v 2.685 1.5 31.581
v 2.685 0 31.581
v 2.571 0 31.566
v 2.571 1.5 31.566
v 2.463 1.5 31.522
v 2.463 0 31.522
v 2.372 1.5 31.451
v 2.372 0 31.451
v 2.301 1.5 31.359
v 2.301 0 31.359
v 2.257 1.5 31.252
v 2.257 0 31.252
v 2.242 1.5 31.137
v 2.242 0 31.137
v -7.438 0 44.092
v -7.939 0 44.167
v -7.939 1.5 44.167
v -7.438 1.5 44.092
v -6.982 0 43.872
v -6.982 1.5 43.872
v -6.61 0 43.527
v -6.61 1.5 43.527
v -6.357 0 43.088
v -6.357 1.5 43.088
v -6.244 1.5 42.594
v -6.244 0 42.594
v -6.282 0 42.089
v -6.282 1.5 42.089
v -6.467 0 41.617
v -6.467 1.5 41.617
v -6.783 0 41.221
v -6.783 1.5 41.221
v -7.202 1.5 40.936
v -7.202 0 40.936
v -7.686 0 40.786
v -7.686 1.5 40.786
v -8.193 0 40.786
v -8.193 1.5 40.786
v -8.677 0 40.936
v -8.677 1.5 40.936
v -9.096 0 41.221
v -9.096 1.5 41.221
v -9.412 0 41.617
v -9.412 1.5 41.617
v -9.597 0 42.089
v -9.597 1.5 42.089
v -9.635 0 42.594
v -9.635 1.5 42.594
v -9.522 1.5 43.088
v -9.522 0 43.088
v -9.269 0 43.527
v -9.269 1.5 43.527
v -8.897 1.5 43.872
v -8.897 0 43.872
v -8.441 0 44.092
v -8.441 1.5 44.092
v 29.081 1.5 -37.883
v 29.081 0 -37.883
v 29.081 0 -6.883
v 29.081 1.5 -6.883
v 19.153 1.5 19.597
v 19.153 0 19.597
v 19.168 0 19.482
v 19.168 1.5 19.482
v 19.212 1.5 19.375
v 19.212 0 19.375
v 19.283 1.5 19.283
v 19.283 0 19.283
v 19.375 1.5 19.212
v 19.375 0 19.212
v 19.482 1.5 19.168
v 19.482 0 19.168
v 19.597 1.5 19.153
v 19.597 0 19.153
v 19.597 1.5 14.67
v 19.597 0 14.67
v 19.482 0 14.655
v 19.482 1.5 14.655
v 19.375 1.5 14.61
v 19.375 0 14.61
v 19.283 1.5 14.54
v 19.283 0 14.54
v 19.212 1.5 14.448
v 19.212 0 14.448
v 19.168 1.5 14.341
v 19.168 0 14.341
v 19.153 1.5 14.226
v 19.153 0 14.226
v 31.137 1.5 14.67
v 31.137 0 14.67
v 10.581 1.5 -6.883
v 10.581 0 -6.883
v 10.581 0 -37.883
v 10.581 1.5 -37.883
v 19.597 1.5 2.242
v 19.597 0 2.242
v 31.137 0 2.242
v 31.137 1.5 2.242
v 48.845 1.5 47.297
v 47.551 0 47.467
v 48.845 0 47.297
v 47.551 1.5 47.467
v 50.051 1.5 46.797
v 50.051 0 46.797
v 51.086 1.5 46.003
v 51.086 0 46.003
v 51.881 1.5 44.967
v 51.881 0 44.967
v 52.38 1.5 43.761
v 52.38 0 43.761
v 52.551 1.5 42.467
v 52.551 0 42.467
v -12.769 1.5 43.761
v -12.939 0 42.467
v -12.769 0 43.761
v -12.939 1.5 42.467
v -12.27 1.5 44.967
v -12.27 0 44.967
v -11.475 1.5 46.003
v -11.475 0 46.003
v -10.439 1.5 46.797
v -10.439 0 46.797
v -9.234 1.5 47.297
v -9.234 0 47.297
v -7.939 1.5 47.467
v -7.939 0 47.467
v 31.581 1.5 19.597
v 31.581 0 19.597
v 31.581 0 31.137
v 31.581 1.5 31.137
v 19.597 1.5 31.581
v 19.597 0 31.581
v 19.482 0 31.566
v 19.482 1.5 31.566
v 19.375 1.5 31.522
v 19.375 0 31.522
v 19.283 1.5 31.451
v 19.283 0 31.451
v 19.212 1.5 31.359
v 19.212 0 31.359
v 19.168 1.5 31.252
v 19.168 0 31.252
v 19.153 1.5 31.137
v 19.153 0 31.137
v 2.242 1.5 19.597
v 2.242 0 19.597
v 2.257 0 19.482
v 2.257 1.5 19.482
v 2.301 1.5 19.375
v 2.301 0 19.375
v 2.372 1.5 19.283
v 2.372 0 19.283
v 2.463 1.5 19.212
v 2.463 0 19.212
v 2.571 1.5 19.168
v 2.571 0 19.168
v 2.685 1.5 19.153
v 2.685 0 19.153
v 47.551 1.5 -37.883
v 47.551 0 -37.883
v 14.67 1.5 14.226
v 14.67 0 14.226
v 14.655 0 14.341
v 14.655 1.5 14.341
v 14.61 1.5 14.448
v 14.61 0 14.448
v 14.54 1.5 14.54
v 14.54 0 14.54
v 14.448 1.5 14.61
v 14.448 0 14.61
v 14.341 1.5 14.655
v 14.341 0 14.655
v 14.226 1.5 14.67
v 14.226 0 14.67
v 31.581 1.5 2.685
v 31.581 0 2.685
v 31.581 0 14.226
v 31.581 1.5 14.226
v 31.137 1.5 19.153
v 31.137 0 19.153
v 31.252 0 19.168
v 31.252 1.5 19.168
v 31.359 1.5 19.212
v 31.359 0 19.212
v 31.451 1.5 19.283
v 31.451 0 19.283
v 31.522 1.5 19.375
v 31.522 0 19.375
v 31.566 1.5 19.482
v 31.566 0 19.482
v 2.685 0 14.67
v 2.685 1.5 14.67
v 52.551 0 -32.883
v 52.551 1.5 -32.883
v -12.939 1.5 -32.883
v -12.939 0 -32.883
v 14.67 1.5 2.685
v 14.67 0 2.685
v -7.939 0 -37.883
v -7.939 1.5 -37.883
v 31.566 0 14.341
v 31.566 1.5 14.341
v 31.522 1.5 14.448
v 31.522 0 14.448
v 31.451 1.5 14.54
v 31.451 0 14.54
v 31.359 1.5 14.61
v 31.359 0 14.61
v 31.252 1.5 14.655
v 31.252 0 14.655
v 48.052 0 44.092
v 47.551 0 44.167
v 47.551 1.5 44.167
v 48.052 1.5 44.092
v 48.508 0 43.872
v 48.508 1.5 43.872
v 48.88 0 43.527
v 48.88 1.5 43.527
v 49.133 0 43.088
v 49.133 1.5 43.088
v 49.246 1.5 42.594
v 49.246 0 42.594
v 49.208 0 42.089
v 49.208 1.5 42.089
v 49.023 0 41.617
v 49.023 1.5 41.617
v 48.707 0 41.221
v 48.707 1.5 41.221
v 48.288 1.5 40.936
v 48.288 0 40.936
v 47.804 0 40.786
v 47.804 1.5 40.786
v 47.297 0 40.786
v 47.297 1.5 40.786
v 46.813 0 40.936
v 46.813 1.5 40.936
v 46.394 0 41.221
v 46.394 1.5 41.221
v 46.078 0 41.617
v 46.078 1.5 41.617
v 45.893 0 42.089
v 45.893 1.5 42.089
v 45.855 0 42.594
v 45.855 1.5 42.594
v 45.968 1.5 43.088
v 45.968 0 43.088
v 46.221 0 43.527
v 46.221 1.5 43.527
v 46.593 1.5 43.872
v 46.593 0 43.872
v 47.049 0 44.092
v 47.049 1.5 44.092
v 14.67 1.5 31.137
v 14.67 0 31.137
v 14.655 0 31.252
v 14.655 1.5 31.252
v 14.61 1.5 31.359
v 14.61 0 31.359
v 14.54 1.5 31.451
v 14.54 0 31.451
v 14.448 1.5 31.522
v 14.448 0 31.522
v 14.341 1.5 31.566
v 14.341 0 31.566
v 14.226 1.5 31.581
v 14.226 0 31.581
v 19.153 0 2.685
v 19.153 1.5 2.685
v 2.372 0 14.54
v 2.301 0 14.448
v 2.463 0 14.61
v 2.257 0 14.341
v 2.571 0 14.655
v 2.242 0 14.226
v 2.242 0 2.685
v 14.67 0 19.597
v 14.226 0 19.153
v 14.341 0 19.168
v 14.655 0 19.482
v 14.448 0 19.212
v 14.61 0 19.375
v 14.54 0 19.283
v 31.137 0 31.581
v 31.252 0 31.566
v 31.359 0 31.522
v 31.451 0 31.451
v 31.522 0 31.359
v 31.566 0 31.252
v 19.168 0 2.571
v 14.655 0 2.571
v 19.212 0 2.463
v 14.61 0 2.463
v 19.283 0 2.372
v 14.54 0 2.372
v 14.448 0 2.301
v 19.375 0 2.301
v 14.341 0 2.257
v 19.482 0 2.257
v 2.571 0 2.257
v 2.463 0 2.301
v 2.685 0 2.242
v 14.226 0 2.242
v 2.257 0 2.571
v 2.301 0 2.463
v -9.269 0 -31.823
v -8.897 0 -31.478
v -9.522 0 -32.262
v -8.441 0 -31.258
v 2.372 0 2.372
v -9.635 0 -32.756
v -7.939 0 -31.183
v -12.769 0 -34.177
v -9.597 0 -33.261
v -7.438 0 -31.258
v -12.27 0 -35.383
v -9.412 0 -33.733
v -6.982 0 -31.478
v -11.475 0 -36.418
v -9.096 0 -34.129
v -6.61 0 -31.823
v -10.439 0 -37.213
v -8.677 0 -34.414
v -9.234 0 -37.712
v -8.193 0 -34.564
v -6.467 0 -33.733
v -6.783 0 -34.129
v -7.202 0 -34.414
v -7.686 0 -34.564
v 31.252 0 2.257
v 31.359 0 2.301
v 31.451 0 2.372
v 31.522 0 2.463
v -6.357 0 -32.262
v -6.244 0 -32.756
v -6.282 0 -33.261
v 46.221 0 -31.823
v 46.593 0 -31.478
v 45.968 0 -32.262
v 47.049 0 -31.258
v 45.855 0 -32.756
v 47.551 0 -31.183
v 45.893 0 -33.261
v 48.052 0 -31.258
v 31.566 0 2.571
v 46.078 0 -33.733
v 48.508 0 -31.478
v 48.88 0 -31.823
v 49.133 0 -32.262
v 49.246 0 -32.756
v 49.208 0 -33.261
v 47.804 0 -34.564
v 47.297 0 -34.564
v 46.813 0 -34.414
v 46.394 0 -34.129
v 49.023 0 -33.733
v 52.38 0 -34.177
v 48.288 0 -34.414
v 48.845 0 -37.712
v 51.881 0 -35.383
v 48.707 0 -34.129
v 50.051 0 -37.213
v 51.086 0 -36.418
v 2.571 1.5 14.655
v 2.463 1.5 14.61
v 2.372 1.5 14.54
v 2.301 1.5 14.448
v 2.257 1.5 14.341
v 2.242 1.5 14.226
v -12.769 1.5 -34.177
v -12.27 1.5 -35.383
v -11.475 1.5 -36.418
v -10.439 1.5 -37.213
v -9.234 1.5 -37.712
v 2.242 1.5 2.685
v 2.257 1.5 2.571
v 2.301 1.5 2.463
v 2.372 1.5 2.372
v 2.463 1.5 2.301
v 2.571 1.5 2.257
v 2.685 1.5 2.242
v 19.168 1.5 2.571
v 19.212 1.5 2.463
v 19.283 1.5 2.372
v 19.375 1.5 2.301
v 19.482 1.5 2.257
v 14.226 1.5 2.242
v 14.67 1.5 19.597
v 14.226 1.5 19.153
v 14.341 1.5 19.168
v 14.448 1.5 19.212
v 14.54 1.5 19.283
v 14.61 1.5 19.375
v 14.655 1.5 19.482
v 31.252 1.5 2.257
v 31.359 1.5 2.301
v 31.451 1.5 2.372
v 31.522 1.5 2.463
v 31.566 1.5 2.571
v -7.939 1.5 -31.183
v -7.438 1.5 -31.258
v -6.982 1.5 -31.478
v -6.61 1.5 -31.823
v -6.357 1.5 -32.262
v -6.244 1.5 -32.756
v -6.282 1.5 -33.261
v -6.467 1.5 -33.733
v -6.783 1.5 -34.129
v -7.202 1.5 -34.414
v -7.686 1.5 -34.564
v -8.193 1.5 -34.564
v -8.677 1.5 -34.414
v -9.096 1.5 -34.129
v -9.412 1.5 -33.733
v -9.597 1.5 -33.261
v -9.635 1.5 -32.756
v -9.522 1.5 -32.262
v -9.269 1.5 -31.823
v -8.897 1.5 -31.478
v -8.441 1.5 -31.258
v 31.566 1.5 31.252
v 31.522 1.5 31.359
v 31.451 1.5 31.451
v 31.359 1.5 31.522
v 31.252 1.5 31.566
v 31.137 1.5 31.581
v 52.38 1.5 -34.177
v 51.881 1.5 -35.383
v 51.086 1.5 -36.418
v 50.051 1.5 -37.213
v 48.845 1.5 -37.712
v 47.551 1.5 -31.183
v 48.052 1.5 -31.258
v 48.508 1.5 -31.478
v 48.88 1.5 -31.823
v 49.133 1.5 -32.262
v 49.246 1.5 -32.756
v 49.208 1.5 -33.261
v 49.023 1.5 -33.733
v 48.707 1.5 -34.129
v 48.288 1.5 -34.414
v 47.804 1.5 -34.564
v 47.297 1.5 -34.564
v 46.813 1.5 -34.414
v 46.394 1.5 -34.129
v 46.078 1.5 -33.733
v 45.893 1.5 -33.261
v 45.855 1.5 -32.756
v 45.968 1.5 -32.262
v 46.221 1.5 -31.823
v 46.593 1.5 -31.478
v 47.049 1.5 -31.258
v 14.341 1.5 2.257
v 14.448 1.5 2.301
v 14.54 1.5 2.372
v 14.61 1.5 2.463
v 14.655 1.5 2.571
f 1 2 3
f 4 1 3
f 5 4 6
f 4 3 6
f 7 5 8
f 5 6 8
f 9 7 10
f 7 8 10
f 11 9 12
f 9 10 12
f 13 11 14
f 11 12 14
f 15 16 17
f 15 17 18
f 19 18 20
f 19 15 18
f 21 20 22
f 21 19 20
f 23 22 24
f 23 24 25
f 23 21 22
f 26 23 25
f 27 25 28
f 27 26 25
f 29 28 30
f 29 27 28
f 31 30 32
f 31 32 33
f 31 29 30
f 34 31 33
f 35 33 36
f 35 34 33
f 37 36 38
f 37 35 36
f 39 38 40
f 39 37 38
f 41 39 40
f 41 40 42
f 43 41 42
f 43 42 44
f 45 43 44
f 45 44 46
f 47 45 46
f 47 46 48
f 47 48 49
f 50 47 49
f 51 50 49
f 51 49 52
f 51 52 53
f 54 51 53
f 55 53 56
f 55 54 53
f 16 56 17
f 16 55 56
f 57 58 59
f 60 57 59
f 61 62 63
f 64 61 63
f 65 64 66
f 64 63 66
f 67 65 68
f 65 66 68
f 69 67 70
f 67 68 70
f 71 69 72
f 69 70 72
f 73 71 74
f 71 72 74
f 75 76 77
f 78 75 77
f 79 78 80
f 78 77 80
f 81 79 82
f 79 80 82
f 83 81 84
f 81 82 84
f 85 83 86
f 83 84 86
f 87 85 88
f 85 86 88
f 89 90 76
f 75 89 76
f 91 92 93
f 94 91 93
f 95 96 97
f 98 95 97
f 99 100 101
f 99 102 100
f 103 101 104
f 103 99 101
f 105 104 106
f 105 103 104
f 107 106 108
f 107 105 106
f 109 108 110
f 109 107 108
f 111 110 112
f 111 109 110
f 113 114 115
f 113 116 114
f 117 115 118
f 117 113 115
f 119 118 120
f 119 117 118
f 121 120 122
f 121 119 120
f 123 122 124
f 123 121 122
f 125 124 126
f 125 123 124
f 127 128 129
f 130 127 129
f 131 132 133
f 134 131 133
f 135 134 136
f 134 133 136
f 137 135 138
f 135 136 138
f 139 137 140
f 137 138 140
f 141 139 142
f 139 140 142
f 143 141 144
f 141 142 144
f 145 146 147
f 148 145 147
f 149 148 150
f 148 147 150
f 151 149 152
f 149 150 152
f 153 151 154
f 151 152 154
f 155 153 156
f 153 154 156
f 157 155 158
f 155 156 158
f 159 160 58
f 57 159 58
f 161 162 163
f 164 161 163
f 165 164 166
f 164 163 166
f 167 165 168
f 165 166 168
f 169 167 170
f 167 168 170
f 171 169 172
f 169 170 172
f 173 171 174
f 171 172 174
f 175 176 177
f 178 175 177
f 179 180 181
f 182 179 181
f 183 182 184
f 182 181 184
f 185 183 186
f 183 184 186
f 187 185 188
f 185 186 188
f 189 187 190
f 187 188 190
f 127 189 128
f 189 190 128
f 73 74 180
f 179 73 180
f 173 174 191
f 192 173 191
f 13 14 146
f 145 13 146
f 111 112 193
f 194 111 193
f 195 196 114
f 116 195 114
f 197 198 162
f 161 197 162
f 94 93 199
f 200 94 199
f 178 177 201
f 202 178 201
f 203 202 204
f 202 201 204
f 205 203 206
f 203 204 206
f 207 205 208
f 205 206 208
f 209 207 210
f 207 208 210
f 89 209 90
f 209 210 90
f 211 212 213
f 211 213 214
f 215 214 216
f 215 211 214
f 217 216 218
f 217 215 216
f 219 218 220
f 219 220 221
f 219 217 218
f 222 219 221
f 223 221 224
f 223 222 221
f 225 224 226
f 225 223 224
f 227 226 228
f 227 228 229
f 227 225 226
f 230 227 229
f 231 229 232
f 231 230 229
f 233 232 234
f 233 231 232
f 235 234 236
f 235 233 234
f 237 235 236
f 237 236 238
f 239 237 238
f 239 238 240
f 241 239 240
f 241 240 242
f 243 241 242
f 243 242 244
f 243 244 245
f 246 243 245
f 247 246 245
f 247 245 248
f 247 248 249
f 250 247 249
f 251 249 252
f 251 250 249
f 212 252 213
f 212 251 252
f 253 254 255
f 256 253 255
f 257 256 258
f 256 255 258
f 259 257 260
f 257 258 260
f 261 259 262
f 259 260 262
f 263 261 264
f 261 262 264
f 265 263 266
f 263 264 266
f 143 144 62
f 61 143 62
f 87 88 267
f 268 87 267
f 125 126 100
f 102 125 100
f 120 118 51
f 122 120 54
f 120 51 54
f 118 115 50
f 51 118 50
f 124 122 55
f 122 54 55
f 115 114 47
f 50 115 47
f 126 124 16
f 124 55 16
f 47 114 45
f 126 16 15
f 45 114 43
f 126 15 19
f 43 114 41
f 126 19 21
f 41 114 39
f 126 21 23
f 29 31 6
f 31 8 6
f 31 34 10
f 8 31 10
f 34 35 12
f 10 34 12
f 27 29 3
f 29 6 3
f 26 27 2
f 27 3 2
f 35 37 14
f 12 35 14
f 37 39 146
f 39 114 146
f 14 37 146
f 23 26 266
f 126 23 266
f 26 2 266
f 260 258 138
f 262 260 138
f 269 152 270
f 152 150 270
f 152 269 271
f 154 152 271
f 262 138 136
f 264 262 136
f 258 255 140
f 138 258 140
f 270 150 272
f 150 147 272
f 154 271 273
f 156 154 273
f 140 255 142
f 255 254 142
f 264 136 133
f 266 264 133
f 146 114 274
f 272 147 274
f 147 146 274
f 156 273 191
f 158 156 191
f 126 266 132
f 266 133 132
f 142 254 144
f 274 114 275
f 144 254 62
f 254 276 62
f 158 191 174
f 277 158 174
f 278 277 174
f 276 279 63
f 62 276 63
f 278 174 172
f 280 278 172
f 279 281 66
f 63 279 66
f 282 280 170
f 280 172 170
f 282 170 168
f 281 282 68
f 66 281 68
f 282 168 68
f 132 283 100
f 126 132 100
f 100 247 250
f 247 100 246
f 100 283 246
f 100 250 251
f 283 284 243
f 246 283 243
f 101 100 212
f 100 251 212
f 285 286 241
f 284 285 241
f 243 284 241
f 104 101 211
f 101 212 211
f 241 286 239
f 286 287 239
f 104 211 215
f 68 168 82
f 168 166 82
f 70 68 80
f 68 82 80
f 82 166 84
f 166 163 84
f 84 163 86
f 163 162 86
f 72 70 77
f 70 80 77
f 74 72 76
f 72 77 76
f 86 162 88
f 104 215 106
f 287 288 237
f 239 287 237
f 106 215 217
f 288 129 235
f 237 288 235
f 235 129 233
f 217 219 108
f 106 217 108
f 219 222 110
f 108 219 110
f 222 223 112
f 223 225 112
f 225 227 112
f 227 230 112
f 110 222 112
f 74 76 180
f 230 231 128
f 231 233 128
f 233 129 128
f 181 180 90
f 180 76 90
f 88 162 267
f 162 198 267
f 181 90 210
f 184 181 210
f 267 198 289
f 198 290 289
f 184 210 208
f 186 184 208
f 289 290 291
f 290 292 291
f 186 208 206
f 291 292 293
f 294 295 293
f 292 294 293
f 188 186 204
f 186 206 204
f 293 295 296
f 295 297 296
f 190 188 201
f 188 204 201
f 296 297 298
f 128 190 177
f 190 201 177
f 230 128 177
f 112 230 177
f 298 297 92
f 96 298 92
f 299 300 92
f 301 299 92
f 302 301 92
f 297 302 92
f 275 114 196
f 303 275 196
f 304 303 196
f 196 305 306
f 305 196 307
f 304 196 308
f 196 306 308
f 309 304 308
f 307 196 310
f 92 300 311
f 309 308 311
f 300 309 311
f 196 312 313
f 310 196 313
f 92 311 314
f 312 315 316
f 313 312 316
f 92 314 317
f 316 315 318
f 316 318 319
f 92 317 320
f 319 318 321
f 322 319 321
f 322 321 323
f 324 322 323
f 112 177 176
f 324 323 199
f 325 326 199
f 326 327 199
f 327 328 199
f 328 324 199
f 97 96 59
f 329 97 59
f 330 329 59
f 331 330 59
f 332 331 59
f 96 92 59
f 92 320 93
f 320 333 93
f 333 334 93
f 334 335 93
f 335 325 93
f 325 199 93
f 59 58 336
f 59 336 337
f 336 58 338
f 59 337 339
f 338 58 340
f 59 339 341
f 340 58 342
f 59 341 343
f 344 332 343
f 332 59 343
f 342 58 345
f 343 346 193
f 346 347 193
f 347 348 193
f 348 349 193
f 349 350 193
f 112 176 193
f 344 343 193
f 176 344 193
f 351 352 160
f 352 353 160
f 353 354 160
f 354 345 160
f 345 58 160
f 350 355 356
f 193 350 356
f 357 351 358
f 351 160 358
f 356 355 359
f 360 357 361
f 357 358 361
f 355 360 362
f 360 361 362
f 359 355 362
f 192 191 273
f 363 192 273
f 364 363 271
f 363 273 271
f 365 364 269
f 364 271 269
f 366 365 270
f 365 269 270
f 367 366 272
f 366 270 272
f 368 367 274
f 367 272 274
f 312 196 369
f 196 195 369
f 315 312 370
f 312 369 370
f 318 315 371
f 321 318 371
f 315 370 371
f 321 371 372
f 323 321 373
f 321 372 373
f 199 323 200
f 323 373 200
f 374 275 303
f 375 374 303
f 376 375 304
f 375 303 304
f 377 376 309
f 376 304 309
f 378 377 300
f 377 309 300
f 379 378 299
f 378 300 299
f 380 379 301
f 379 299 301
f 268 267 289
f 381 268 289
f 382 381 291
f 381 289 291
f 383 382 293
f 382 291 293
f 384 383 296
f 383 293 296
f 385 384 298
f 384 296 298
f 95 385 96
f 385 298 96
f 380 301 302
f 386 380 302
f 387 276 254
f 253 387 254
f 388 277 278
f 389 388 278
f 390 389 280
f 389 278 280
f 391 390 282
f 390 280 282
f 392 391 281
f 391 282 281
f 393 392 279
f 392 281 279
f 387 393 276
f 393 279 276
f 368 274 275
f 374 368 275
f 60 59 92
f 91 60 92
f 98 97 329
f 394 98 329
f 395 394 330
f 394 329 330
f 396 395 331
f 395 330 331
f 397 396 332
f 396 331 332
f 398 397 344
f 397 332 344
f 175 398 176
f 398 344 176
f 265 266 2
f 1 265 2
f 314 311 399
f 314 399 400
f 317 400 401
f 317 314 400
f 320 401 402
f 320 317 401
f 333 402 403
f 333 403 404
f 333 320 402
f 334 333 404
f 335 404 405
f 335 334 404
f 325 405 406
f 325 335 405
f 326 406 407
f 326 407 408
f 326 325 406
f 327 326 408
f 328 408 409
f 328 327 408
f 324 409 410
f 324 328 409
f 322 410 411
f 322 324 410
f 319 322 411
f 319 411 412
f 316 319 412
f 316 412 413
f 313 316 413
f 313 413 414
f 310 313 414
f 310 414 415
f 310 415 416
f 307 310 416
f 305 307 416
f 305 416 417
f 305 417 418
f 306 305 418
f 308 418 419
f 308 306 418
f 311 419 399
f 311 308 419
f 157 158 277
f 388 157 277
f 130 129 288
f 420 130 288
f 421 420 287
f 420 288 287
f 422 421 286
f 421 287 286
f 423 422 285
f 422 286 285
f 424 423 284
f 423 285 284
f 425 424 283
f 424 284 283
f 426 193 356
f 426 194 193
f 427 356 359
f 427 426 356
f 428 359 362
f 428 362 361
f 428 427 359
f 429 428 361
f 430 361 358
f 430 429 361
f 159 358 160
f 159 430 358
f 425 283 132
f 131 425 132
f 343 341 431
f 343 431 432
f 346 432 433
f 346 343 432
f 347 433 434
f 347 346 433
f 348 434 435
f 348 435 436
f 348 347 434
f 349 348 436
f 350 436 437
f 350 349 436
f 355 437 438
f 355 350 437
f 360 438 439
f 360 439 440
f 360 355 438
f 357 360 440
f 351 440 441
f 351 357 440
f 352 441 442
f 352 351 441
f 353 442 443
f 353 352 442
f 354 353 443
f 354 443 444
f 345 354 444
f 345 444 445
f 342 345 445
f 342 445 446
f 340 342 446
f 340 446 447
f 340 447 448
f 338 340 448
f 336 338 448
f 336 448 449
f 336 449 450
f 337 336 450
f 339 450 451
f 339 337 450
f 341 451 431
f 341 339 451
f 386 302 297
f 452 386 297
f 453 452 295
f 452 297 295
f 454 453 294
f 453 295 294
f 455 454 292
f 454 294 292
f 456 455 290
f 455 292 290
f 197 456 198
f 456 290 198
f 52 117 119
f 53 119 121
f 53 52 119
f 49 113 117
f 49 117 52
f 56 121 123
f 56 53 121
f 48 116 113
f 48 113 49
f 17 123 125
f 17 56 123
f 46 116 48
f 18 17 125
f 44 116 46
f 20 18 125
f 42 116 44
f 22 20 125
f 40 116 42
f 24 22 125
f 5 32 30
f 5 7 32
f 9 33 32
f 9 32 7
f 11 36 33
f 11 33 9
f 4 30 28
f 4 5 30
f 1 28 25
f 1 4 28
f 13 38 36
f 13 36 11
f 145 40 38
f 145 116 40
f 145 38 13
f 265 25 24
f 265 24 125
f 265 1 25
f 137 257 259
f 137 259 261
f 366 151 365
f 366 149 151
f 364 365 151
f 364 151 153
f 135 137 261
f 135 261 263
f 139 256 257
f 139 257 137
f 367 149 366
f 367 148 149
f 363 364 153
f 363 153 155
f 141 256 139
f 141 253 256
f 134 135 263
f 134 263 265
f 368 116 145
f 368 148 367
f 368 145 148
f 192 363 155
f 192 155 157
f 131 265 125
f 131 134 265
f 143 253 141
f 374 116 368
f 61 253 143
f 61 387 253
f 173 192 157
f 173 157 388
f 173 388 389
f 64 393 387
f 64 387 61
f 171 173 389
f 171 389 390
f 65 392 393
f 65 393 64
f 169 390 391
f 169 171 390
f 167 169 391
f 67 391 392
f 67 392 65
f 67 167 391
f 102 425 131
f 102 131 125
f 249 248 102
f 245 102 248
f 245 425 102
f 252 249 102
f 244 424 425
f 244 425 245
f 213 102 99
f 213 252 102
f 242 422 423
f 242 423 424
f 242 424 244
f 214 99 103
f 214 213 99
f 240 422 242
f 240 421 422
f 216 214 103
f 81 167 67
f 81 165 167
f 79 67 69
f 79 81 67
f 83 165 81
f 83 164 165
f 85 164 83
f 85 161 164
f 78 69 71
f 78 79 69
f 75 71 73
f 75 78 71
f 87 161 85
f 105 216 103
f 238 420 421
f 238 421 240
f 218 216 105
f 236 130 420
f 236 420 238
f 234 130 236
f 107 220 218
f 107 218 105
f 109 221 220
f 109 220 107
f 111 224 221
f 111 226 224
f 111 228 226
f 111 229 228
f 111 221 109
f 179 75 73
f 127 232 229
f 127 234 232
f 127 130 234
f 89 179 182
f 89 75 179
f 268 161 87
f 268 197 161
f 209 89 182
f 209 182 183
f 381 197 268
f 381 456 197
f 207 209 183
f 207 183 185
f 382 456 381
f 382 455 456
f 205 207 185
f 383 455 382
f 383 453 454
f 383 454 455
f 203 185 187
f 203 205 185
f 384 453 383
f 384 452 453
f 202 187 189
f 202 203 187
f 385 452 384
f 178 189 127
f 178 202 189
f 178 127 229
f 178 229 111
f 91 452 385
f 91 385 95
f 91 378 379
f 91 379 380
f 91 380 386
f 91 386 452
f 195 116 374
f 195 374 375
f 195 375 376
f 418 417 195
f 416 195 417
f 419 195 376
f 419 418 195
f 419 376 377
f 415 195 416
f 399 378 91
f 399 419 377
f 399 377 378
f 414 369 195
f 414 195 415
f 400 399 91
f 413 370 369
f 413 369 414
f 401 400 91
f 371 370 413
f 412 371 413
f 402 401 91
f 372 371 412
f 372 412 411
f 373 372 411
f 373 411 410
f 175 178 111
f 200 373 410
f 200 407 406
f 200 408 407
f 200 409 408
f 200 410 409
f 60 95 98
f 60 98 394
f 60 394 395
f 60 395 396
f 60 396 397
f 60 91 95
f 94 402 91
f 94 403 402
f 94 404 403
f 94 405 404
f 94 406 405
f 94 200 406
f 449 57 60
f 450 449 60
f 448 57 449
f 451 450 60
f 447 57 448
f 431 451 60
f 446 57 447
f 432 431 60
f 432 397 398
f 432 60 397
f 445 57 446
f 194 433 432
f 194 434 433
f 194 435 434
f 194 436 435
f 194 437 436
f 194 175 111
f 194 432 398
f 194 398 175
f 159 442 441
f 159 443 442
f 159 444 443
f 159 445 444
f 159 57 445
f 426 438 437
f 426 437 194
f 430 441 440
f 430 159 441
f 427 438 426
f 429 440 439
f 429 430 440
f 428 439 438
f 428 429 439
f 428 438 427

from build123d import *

# Parameters (mm, degrees)
SKETCH1_R           = 1.7
BOSS_EXTRUDE1_DEPTH = 1.5
FILLET1_R           = 5


with BuildPart() as part:
    # Sketch1 → Boss-Extrude1 (new body)
    with BuildSketch(Plane(origin=(0, 0, 0), x_dir=(1, 0, 0), z_dir=(0, 1, 0))):
        Polygon((-12.939466701, 37.882793222), (-12.939466701, -47.467206778), (52.550533299, -47.467206778), (52.550533299, 37.882793222), (29.080533299, 37.882793222), (29.080533299, 6.882793222), (10.580533299, 6.882793222), (10.580533299, 37.882793222), align=None)
        with Locations(Location((-7.939466701, -42.467206778, 0), (0, 0, 270))):
            Circle(SKETCH1_R, mode=Mode.SUBTRACT)
        with BuildLine():
            ThreePointArc((2.241533299, -19.596771318), (2.37153922, -19.282909259), (2.685401279, -19.152903338))
            Line((2.685401279, -19.152903338), (14.22596876, -19.152903338))
            ThreePointArc((14.22596876, -19.152903338), (14.539830818, -19.282909259), (14.66983674, -19.596771318))
            Line((14.66983674, -19.596771318), (14.66983674, -31.137338798))
            ThreePointArc((14.66983674, -31.137338798), (14.539830818, -31.451200857), (14.22596876, -31.581206778))
            Line((14.22596876, -31.581206778), (2.685401279, -31.581206778))
            ThreePointArc((2.685401279, -31.581206778), (2.37153922, -31.451200857), (2.241533299, -31.137338798))
            Line((2.241533299, -31.137338798), (2.241533299, -19.596771318))
        make_face(mode=Mode.SUBTRACT)
        with BuildLine():
            ThreePointArc((2.241533299, -2.685401279), (2.37153922, -2.37153922), (2.685401279, -2.241533299))
            Line((2.685401279, -2.241533299), (14.22596876, -2.241533299))
            ThreePointArc((14.22596876, -2.241533299), (14.539830818, -2.37153922), (14.66983674, -2.685401279))
            Line((14.66983674, -2.685401279), (14.66983674, -14.22596876))
            ThreePointArc((14.66983674, -14.22596876), (14.539830818, -14.539830818), (14.22596876, -14.66983674))
            Line((14.22596876, -14.66983674), (2.685401279, -14.66983674))
            ThreePointArc((2.685401279, -14.66983674), (2.37153922, -14.539830818), (2.241533299, -14.22596876))
            Line((2.241533299, -14.22596876), (2.241533299, -2.685401279))
        make_face(mode=Mode.SUBTRACT)
        with Locations(Location((47.550533299, -42.467206778, 0), (0, 0, 270))):
            Circle(SKETCH1_R, mode=Mode.SUBTRACT)
        with BuildLine():
            ThreePointArc((19.152903338, -19.596771318), (19.282909259, -19.282909259), (19.596771318, -19.152903338))
            Line((19.596771318, -19.152903338), (31.137338798, -19.152903338))
            ThreePointArc((31.137338798, -19.152903338), (31.451200857, -19.282909259), (31.581206778, -19.596771318))
            Line((31.581206778, -19.596771318), (31.581206778, -31.137338798))
            ThreePointArc((31.581206778, -31.137338798), (31.451200857, -31.451200857), (31.137338798, -31.581206778))
            Line((31.137338798, -31.581206778), (19.596771318, -31.581206778))
            ThreePointArc((19.596771318, -31.581206778), (19.282909259, -31.451200857), (19.152903338, -31.137338798))
            Line((19.152903338, -31.137338798), (19.152903338, -19.596771318))
        make_face(mode=Mode.SUBTRACT)
        with BuildLine():
            ThreePointArc((19.152903338, -2.685401279), (19.282909259, -2.37153922), (19.596771318, -2.241533299))
            Line((19.596771318, -2.241533299), (31.137338798, -2.241533299))
            ThreePointArc((31.137338798, -2.241533299), (31.451200857, -2.37153922), (31.581206778, -2.685401279))
            Line((31.581206778, -2.685401279), (31.581206778, -14.22596876))
            ThreePointArc((31.581206778, -14.22596876), (31.451200857, -14.539830818), (31.137338798, -14.66983674))
            Line((31.137338798, -14.66983674), (19.596771318, -14.66983674))
            ThreePointArc((19.596771318, -14.66983674), (19.282909259, -14.539830818), (19.152903338, -14.22596876))
            Line((19.152903338, -14.22596876), (19.152903338, -2.685401279))
        make_face(mode=Mode.SUBTRACT)
        with Locations(Location((-7.939466701, 32.882793222, 0), (0, 0, 270))):
            Circle(SKETCH1_R, mode=Mode.SUBTRACT)
        with Locations(Location((47.550533299, 32.882793222, 0), (0, 0, 270))):
            Circle(SKETCH1_R, mode=Mode.SUBTRACT)
    extrude(amount=BOSS_EXTRUDE1_DEPTH)

    # Fillet1
    fillet1_edges = [part.edges().sort_by_distance(p)[0] for p in [
        (52.550533299, 0.75, -37.882793222),
        (52.550533299, 0.75, 47.467206778),
        (-12.939466701, 0.75, 47.467206778),
        (-12.939466701, 0.75, -37.882793222),
    ]]
    fillet(fillet1_edges, radius=FILLET1_R)


solid = part.part
